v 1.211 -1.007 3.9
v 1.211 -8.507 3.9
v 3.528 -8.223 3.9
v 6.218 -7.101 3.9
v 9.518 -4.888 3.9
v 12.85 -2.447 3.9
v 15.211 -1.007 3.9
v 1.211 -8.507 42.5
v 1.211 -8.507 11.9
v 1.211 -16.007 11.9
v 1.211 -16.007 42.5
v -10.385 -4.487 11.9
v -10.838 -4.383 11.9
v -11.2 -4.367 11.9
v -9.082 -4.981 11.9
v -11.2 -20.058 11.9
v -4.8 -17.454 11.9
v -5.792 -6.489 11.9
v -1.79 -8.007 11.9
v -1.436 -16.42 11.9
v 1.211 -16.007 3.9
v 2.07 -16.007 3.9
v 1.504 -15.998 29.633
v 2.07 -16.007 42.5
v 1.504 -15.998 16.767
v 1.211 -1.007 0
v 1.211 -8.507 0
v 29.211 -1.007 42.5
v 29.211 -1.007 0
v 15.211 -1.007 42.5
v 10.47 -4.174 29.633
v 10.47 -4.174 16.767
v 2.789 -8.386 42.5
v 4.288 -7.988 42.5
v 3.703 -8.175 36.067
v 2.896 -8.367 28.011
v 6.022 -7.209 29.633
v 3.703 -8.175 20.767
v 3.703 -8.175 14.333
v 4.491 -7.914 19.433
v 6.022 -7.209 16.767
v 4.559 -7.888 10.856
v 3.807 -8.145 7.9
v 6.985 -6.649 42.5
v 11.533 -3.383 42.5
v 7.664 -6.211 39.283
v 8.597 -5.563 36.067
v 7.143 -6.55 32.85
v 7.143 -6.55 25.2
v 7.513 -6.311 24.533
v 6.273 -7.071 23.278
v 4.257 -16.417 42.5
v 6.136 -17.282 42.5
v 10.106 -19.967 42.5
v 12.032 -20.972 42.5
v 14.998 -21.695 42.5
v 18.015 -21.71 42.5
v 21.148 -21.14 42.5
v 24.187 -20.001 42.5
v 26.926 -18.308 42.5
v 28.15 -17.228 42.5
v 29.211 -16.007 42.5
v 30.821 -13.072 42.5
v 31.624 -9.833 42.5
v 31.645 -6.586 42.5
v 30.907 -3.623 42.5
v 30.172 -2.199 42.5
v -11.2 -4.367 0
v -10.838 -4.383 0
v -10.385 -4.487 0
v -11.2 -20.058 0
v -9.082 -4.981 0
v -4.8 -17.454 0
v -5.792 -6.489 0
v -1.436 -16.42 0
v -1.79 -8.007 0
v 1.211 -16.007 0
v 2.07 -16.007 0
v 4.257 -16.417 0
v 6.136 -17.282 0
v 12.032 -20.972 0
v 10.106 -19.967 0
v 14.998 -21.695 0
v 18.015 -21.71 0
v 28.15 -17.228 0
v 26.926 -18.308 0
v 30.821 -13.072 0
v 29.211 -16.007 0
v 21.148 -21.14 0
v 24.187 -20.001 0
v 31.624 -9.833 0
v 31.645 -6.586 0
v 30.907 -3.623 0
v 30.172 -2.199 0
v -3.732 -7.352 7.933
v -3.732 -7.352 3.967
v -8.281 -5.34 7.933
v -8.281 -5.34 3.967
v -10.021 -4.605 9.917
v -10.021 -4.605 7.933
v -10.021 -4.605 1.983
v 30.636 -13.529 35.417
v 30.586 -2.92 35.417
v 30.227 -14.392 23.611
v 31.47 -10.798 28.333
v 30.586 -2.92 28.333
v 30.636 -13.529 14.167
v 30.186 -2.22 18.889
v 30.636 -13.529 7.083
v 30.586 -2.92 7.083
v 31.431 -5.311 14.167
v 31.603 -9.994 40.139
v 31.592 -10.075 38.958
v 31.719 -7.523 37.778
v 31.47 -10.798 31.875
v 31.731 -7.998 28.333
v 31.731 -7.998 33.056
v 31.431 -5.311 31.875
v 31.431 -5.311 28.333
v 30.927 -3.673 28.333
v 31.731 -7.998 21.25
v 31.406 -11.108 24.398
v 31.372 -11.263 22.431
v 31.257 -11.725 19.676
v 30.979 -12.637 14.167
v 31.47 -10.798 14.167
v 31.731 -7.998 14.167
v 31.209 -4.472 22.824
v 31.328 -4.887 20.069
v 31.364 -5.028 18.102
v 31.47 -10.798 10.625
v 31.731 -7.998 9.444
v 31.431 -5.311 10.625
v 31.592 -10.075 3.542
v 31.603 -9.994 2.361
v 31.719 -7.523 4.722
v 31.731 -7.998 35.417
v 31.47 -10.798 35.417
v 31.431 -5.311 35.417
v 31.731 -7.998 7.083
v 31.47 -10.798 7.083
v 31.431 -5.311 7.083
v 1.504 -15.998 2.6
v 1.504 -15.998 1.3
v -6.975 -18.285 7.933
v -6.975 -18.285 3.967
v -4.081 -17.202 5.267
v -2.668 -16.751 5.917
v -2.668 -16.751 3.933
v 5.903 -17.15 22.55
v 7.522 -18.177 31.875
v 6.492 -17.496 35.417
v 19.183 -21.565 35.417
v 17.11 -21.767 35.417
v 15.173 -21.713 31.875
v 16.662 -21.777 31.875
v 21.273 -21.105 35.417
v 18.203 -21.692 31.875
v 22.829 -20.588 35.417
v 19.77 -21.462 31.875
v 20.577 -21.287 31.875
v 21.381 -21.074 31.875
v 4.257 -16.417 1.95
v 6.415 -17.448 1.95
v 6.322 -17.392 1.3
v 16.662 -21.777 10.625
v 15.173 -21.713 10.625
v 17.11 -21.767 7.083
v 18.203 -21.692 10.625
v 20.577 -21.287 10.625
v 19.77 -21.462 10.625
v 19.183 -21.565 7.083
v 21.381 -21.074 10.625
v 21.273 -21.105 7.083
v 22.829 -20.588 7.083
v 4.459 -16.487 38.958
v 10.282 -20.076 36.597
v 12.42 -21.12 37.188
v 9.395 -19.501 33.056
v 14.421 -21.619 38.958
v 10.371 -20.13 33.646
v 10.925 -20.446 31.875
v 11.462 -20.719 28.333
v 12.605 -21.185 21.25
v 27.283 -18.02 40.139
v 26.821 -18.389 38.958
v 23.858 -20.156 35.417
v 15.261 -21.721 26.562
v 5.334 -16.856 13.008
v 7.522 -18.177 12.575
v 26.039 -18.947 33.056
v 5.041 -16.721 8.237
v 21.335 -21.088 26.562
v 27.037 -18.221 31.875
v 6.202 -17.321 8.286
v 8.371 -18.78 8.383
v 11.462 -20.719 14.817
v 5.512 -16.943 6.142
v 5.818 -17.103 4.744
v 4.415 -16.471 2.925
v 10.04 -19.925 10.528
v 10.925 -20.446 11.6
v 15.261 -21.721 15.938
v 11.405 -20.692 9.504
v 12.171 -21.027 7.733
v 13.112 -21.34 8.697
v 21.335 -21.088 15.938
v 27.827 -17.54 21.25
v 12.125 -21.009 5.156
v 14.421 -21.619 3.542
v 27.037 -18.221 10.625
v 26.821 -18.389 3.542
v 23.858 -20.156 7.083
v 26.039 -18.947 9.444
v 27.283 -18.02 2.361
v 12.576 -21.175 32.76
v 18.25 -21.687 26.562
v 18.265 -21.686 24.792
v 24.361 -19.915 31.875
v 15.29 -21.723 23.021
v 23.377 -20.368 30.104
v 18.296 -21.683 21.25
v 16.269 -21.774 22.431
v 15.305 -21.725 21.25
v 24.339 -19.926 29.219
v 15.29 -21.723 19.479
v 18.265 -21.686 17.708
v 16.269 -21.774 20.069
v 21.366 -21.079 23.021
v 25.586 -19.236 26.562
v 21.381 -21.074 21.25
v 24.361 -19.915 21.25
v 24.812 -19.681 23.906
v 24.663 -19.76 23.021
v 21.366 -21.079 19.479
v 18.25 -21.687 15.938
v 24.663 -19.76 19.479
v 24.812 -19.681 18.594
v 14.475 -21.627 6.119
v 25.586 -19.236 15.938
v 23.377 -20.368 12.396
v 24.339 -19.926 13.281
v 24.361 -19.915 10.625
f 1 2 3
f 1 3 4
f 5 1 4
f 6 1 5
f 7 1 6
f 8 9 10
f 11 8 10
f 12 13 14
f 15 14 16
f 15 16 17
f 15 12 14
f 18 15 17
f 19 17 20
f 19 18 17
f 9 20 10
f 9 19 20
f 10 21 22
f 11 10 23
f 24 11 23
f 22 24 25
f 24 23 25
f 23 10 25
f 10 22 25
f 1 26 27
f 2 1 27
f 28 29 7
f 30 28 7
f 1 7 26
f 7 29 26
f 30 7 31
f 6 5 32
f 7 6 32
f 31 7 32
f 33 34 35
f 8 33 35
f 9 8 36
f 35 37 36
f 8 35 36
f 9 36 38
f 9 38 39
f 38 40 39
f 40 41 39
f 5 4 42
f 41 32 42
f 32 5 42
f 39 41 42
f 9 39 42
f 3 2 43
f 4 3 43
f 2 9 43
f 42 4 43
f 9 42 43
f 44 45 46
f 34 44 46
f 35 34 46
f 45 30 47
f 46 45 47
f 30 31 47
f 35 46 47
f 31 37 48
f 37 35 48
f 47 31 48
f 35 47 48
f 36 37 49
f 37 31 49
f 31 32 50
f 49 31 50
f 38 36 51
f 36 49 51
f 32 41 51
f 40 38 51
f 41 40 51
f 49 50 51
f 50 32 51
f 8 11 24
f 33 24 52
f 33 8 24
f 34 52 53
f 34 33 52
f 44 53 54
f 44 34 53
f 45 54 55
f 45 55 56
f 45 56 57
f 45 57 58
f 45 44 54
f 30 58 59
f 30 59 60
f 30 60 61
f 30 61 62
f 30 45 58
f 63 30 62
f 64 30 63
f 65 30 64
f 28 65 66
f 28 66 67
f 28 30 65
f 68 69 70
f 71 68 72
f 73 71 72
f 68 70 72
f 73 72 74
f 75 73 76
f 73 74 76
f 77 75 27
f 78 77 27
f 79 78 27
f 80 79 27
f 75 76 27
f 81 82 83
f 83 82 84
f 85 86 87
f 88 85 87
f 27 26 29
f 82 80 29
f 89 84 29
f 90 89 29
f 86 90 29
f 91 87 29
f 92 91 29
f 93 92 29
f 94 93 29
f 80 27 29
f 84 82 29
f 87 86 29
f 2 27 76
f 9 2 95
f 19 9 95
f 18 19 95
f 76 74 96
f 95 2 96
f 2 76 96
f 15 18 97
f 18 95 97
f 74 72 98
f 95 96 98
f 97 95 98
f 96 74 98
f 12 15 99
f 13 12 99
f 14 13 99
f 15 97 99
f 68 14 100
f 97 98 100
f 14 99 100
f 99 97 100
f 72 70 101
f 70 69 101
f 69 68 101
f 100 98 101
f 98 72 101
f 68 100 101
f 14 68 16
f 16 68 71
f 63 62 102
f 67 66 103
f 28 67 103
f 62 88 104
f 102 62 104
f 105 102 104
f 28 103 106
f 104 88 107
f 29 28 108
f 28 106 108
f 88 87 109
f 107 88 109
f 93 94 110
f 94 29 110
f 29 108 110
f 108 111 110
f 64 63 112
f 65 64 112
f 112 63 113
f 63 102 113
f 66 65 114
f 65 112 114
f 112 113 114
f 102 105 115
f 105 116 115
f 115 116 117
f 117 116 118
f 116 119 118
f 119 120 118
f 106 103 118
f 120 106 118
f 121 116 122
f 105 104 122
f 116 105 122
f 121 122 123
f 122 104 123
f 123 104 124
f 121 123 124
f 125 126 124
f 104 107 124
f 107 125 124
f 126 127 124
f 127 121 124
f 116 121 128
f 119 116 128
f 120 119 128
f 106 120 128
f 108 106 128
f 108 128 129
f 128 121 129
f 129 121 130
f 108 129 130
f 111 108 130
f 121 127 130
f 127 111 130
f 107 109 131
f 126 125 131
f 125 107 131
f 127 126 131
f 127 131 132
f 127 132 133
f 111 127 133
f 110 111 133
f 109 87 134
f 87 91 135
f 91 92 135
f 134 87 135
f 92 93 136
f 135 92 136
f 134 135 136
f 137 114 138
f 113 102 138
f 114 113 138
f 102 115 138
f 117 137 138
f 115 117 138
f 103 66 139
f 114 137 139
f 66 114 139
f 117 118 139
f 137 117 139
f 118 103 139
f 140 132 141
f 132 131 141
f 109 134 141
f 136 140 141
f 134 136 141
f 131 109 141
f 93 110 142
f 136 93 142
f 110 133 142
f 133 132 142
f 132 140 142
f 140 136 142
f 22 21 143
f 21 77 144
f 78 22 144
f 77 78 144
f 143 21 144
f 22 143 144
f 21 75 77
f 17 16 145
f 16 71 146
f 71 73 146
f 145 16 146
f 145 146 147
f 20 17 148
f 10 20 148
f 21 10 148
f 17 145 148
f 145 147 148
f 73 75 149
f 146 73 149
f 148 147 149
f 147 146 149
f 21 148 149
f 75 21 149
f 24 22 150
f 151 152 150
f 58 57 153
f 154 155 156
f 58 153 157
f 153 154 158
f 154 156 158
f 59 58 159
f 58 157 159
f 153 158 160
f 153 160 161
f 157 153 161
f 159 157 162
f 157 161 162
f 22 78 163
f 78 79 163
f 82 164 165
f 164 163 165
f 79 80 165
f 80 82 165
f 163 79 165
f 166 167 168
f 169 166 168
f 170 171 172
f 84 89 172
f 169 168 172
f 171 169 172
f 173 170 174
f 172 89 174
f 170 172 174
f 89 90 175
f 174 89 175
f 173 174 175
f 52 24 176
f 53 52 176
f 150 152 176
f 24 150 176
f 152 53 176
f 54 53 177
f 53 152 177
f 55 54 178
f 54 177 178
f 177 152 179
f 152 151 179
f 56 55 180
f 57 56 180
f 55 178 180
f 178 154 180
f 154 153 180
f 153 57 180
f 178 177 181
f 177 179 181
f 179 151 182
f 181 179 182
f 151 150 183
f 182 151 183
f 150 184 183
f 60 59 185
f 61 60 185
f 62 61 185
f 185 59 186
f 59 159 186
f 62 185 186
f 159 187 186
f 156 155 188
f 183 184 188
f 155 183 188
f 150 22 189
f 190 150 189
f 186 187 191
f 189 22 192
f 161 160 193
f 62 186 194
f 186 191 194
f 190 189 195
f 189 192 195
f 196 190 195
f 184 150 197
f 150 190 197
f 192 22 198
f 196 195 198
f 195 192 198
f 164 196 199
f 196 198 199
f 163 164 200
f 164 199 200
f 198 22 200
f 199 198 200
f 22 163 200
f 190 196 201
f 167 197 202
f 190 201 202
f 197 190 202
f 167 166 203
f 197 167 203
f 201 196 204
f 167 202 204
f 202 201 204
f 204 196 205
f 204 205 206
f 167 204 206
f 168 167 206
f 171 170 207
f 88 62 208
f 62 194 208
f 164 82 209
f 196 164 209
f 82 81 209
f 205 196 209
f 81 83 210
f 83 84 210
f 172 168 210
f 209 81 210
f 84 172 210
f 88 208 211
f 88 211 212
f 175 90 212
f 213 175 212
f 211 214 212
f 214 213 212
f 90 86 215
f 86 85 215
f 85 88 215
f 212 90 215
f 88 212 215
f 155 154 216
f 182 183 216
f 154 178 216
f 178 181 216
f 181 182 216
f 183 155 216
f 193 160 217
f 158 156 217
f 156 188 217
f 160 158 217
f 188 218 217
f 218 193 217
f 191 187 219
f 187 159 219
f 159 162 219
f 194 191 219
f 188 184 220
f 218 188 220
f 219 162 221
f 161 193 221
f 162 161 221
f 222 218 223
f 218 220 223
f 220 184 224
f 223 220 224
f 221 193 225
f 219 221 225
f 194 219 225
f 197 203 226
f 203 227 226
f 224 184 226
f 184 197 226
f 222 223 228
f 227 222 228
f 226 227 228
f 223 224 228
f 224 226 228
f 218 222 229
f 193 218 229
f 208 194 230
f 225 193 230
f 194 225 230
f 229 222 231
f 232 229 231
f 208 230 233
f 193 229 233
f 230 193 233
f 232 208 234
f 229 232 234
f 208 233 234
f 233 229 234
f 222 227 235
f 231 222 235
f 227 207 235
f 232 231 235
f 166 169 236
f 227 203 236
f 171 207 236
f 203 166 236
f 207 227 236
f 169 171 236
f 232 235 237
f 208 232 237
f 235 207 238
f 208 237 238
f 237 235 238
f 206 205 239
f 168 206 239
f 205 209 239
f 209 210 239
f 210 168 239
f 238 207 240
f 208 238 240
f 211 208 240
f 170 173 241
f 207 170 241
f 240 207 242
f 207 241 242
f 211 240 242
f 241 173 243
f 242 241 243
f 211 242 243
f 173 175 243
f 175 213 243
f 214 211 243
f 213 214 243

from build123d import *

# Parameters (mm, degrees)
F1_DEPTH = 3.9
F2_DEPTH = 11.9
F3_DEPTH = 42.5


with BuildPart() as f1:
    # F0 (on Top) → F1 (new body)
    with BuildSketch(Plane.XY):
        with BuildLine():
            Line((15.2110805884, -1.0073357602), (1.2110805884, -1.0073357602))
            Line((1.2110805884, -1.0073357602), (1.2110805884, -8.5073357602))
            add(Edge.make_bspline(
                [(15.2110805884, -1.0073357602), (10.1056651112, -3.7045784545), (6.4222975956, -8.6121569817), (1.2110805884, -8.5073357602)],
                knots=[0.5948688465, 0.5948688465, 0.5948688465, 0.5948688465, 0.7145243028, 0.7145243028, 0.7145243028, 0.7145243028], degree=3))
        make_face()
        with BuildLine():
            Line((29.2110805884, -1.0073357602), (15.2110805884, -1.0073357602))
            add(Edge.make_bspline(
                [(15.2110805884, -1.0073357602), (10.1056651112, -3.7045784545), (6.4222975956, -8.6121569817), (1.2110805884, -8.5073357602)],
                knots=[0.5948688465, 0.5948688465, 0.5948688465, 0.5948688465, 0.7145243028, 0.7145243028, 0.7145243028, 0.7145243028], degree=3))
            Line((1.2110805884, -8.5073357602), (1.2110805884, -16.0073357602))
            add(Edge.make_bspline(
                [(1.2110805884, -16.0073357602), (1.5073310932, -15.9933259222), (1.7934505794, -15.9937789675), (2.0704529167, -16.0073357602)],
                knots=[0.1348057981, 0.1348057981, 0.1348057981, 0.1348057981, 0.1410104438, 0.1410104438, 0.1410104438, 0.1410104438], degree=3))
            Line((2.0704529167, -16.0073357602), (29.2110805884, -16.0073357602))
            Line((29.2110805884, -16.0073357602), (29.2110805884, -1.0073357602))
        make_face()
    extrude(amount=F1_DEPTH)

    # F0 (on Top) → F2 (join)
    with BuildSketch(Plane.XY):
        with BuildLine():
            Line((1.2110805884, -16.0073357602), (1.2110805884, -8.5073357602))
            add(Edge.make_bspline(
                [(1.2110805884, -8.5073357602), (-3.5186716625, -8.4121989798), (-9.506998743, -4.1880690008), (-11.1998226494, -4.3673282489)],
                knots=[0.7145243028, 0.7145243028, 0.7145243028, 0.7145243028, 0.823124782, 0.823124782, 0.823124782, 0.823124782], degree=3))
            Line((-11.1998226499, -4.367328249), (-11.1998226499, -20.0583143803))
            add(Edge.make_bspline(
                [(-11.1998226499, -20.0583143803), (-7.1868911838, -18.3499221531), (-2.2831850449, -16.1725813711), (1.2110805884, -16.0073357602)],
                knots=[0.0616221929, 0.0616221929, 0.0616221929, 0.0616221929, 0.1348057981, 0.1348057981, 0.1348057981, 0.1348057981], degree=3))
        make_face()
    extrude(amount=F2_DEPTH)

    # F0 (on Top) → F3 (join)
    with BuildSketch(Plane.XY):
        with BuildLine():
            Line((29.2110805884, -1.0073357602), (15.2110805884, -1.0073357602))
            add(Edge.make_bspline(
                [(15.2110805884, -1.0073357602), (10.1056651112, -3.7045784545), (6.4222975956, -8.6121569817), (1.2110805884, -8.5073357602)],
                knots=[0.5948688465, 0.5948688465, 0.5948688465, 0.5948688465, 0.7145243028, 0.7145243028, 0.7145243028, 0.7145243028], degree=3))
            Line((1.2110805884, -8.5073357602), (1.2110805884, -16.0073357602))
            add(Edge.make_bspline(
                [(1.2110805884, -16.0073357602), (1.5073310932, -15.9933259222), (1.7934505794, -15.9937789675), (2.0704529167, -16.0073357602)],
                knots=[0.1348057981, 0.1348057981, 0.1348057981, 0.1348057981, 0.1410104438, 0.1410104438, 0.1410104438, 0.1410104438], degree=3))
            Line((2.0704529167, -16.0073357602), (29.2110805884, -16.0073357602))
            Line((29.2110805884, -16.0073357602), (29.2110805884, -1.0073357602))
        make_face()
        with BuildLine():
            add(Edge.make_bspline(
                [(29.2110805884, -16.0073357602), (32.6593398461, -11.4234913165), (32.4818190242, -4.2330775311), (29.2110805884, -1.0073357602)],
                knots=[0.3662436292, 0.3662436292, 0.3662436292, 0.3662436292, 0.4825277311, 0.4825277311, 0.4825277311, 0.4825277311], degree=3))
            Line((29.2110805884, -1.0073357602), (29.2110805884, -16.0073357602))
        make_face()
        with BuildLine():
            add(Edge.make_bspline(
                [(2.0704529167, -16.0073357602), (6.535385921, -16.225854391), (11.2561235238, -24.3852753557), (25.4977786279, -20.9435071114), (29.2110805884, -16.0073357602)],
                knots=[0.1410104438, 0.1410104438, 0.1410104438, 0.1410104438, 0.2410216109, 0.3662436292, 0.3662436292, 0.3662436292, 0.3662436292], degree=3))
            Line((29.2110805884, -16.0073357602), (2.0704529167, -16.0073357602))
        make_face()
    extrude(amount=F3_DEPTH)


solid = f1.part
